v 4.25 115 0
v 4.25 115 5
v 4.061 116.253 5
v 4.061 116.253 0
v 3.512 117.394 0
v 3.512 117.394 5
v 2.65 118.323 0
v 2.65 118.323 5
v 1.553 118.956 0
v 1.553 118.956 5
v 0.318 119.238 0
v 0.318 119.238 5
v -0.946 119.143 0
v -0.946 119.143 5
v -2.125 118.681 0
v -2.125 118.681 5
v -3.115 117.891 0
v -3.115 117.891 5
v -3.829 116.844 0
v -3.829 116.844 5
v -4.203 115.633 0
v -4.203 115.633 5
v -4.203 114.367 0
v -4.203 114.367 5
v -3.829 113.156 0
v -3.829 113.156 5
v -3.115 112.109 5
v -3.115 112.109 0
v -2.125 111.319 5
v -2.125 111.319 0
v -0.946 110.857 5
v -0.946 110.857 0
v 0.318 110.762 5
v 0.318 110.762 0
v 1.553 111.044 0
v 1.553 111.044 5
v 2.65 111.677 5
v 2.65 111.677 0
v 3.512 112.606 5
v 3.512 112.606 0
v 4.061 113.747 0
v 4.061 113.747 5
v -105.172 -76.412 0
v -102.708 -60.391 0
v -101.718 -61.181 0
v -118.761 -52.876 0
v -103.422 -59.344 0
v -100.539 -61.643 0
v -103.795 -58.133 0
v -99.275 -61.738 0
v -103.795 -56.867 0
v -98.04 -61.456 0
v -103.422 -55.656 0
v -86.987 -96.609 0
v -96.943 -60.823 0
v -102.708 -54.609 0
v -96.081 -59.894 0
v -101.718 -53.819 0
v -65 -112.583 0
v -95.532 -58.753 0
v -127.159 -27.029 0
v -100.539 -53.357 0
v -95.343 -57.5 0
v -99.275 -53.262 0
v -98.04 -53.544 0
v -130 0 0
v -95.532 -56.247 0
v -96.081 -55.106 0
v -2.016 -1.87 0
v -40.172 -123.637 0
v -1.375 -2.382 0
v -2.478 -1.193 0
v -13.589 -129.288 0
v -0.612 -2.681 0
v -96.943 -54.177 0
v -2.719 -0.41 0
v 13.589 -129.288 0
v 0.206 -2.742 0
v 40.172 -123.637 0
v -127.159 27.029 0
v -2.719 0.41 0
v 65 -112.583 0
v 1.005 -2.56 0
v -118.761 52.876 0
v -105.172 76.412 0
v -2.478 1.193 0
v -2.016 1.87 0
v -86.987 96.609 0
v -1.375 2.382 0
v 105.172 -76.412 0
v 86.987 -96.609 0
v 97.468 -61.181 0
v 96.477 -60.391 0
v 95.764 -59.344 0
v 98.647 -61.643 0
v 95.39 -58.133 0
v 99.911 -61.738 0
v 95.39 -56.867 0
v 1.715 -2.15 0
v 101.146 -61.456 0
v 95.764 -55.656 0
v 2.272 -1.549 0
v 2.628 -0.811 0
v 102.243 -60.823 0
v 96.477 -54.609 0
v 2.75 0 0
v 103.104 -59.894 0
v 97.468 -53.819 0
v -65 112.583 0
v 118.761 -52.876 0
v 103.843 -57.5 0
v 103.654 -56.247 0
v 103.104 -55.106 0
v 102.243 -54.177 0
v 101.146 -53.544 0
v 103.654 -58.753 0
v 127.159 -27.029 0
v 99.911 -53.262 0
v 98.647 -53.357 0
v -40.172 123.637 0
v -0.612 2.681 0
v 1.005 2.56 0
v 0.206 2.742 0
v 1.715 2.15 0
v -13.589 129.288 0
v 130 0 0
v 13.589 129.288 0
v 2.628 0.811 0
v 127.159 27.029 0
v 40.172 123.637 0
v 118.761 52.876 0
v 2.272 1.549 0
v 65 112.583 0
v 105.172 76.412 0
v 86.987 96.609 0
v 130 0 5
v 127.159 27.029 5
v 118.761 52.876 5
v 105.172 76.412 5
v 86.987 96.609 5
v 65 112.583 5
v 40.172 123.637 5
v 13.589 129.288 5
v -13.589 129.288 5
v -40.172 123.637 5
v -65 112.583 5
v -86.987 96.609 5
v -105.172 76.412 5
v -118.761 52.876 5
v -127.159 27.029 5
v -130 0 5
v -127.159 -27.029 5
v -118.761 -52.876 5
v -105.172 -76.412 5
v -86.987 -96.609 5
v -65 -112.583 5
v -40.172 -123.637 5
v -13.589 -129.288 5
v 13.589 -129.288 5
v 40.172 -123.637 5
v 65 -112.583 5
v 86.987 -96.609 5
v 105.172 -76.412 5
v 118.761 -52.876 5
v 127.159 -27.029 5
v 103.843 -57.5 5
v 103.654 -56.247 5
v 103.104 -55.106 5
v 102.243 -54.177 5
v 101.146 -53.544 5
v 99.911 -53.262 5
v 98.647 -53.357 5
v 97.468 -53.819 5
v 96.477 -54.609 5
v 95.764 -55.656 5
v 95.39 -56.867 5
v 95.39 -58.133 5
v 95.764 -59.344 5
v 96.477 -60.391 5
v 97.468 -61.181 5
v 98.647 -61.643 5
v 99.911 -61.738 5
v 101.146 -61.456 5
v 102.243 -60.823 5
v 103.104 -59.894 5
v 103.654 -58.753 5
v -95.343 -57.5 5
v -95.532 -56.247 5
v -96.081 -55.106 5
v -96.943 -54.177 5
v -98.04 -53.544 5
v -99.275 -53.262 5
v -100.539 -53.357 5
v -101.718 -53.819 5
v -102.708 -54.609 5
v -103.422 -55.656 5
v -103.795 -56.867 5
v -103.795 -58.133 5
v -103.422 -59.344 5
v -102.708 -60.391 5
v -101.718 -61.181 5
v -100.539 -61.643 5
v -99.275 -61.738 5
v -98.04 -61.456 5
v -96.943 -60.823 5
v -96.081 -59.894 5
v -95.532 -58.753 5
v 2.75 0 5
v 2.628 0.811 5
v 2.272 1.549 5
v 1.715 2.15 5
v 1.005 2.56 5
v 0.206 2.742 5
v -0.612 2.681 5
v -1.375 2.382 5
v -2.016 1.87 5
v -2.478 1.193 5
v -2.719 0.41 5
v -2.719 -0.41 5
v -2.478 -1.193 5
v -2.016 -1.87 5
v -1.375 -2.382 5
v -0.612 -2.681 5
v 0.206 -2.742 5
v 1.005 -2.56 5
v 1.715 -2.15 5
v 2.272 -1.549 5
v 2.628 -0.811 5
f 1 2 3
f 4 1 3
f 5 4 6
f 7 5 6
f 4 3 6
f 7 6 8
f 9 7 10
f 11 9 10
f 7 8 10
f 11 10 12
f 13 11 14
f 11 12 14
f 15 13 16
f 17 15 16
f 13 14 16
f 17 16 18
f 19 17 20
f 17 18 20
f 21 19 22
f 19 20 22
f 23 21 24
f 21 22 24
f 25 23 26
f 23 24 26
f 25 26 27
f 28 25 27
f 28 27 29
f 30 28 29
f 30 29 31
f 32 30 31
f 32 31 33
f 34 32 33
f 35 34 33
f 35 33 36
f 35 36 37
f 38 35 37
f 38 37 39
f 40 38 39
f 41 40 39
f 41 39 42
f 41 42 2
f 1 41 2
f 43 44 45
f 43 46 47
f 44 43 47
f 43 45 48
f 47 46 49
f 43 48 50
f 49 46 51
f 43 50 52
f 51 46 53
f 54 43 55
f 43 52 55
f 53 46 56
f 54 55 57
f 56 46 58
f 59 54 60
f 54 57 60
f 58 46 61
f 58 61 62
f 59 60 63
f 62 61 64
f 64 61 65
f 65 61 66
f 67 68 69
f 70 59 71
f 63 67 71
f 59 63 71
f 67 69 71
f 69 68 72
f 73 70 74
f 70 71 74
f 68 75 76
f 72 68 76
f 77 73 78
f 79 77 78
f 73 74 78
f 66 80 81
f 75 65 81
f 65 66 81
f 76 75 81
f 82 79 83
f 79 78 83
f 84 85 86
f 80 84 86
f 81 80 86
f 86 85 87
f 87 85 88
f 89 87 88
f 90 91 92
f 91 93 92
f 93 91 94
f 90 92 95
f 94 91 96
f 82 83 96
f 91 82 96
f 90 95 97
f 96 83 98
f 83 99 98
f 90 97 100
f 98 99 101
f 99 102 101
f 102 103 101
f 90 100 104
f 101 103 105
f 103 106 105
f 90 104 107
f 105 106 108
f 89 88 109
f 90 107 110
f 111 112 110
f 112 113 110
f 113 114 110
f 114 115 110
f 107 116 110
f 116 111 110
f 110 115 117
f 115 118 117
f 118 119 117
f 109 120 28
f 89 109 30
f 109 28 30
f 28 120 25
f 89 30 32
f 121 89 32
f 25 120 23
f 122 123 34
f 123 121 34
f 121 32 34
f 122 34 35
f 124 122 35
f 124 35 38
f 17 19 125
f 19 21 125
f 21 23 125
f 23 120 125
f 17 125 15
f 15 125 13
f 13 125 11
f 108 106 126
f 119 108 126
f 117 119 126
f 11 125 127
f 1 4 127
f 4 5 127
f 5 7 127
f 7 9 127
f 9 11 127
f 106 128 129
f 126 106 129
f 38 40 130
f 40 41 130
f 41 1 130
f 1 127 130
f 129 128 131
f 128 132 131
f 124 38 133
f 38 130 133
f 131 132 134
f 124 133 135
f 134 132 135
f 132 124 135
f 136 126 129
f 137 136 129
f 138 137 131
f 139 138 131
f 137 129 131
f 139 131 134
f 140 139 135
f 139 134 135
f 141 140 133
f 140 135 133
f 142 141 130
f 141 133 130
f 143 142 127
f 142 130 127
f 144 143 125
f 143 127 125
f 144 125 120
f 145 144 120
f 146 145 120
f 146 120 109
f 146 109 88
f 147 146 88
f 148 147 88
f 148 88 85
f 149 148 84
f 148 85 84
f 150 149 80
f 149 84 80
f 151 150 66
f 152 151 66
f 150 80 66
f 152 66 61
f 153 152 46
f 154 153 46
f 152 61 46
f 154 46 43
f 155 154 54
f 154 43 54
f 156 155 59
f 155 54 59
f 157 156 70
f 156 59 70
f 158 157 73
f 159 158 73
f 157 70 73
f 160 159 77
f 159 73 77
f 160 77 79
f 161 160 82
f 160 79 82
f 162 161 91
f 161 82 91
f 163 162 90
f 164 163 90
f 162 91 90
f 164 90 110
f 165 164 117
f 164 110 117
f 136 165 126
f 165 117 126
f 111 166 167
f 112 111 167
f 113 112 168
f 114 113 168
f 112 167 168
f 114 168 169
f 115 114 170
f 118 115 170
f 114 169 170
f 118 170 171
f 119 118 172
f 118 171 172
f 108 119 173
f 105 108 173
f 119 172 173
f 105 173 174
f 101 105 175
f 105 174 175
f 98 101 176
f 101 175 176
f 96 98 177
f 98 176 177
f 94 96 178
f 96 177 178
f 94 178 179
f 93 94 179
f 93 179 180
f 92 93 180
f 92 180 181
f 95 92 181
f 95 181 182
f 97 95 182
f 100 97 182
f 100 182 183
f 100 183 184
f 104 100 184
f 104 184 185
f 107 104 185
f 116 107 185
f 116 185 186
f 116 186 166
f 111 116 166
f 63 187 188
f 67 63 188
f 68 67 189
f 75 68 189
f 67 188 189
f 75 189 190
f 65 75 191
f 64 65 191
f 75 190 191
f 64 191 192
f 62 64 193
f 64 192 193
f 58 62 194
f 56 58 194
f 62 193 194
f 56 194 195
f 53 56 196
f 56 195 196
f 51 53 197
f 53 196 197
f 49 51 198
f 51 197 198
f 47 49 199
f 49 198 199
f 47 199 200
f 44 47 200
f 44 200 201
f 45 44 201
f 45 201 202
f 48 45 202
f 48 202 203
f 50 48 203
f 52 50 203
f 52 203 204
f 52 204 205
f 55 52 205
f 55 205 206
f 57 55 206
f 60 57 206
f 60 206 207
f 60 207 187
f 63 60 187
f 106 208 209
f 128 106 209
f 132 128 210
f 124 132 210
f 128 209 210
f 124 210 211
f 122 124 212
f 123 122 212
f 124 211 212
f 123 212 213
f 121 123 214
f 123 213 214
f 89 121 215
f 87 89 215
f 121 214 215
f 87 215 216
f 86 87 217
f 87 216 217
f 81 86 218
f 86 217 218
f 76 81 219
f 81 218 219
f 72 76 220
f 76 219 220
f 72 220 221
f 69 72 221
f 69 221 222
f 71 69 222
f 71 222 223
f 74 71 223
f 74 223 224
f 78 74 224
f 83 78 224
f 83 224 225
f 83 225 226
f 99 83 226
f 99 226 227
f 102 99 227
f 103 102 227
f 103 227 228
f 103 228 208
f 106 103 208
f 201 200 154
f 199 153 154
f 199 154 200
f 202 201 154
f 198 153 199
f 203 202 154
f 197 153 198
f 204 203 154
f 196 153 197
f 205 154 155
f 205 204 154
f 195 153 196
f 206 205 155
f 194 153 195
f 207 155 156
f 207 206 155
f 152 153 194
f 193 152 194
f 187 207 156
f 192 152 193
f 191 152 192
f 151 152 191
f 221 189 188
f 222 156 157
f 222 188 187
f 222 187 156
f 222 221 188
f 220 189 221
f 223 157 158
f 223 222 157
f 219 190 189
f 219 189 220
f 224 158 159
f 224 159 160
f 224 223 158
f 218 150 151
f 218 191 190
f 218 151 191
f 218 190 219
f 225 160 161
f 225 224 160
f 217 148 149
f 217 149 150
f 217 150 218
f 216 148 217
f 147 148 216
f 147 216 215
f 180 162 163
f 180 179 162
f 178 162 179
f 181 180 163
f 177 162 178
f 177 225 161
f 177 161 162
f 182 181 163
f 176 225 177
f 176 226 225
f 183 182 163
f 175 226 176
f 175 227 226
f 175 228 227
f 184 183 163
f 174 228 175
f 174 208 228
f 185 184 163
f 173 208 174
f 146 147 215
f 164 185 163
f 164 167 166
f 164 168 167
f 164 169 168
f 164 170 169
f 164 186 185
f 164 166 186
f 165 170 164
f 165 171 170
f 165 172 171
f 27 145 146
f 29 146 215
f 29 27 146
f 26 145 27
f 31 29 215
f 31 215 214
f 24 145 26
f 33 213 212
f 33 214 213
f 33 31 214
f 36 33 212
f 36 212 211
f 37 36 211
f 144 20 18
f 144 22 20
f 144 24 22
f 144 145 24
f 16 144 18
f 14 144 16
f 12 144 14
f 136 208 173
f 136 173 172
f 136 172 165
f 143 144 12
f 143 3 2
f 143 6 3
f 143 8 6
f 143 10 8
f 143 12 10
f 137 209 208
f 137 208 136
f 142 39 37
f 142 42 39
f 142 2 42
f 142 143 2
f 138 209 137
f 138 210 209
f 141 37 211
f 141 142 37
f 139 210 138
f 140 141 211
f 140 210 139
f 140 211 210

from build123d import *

# Parameters (mm, degrees)
F0_R     = 130
F1_DEPTH = 5
F2_R     = 2.75
F2_R_2   = 4.25
F3_DEPTH = 5.001


with BuildPart() as f1:
    # F0 (on Top) → F1 (new body)
    with BuildSketch(Plane.XY):
        Circle(F0_R)
    extrude(amount=F1_DEPTH)

    # F2 (on face) → F3 (cut, through all)
    with BuildSketch(Plane.XY.offset(5)):
        Circle(F2_R)
        with Locations((0, 115)):
            Circle(F2_R_2)
        with Locations((-99.592921, -57.5)):
            Circle(F2_R_2)
        with Locations((99.592921, -57.5)):
            Circle(F2_R_2)
    extrude(amount=-F3_DEPTH, mode=Mode.SUBTRACT)


solid = f1.part
